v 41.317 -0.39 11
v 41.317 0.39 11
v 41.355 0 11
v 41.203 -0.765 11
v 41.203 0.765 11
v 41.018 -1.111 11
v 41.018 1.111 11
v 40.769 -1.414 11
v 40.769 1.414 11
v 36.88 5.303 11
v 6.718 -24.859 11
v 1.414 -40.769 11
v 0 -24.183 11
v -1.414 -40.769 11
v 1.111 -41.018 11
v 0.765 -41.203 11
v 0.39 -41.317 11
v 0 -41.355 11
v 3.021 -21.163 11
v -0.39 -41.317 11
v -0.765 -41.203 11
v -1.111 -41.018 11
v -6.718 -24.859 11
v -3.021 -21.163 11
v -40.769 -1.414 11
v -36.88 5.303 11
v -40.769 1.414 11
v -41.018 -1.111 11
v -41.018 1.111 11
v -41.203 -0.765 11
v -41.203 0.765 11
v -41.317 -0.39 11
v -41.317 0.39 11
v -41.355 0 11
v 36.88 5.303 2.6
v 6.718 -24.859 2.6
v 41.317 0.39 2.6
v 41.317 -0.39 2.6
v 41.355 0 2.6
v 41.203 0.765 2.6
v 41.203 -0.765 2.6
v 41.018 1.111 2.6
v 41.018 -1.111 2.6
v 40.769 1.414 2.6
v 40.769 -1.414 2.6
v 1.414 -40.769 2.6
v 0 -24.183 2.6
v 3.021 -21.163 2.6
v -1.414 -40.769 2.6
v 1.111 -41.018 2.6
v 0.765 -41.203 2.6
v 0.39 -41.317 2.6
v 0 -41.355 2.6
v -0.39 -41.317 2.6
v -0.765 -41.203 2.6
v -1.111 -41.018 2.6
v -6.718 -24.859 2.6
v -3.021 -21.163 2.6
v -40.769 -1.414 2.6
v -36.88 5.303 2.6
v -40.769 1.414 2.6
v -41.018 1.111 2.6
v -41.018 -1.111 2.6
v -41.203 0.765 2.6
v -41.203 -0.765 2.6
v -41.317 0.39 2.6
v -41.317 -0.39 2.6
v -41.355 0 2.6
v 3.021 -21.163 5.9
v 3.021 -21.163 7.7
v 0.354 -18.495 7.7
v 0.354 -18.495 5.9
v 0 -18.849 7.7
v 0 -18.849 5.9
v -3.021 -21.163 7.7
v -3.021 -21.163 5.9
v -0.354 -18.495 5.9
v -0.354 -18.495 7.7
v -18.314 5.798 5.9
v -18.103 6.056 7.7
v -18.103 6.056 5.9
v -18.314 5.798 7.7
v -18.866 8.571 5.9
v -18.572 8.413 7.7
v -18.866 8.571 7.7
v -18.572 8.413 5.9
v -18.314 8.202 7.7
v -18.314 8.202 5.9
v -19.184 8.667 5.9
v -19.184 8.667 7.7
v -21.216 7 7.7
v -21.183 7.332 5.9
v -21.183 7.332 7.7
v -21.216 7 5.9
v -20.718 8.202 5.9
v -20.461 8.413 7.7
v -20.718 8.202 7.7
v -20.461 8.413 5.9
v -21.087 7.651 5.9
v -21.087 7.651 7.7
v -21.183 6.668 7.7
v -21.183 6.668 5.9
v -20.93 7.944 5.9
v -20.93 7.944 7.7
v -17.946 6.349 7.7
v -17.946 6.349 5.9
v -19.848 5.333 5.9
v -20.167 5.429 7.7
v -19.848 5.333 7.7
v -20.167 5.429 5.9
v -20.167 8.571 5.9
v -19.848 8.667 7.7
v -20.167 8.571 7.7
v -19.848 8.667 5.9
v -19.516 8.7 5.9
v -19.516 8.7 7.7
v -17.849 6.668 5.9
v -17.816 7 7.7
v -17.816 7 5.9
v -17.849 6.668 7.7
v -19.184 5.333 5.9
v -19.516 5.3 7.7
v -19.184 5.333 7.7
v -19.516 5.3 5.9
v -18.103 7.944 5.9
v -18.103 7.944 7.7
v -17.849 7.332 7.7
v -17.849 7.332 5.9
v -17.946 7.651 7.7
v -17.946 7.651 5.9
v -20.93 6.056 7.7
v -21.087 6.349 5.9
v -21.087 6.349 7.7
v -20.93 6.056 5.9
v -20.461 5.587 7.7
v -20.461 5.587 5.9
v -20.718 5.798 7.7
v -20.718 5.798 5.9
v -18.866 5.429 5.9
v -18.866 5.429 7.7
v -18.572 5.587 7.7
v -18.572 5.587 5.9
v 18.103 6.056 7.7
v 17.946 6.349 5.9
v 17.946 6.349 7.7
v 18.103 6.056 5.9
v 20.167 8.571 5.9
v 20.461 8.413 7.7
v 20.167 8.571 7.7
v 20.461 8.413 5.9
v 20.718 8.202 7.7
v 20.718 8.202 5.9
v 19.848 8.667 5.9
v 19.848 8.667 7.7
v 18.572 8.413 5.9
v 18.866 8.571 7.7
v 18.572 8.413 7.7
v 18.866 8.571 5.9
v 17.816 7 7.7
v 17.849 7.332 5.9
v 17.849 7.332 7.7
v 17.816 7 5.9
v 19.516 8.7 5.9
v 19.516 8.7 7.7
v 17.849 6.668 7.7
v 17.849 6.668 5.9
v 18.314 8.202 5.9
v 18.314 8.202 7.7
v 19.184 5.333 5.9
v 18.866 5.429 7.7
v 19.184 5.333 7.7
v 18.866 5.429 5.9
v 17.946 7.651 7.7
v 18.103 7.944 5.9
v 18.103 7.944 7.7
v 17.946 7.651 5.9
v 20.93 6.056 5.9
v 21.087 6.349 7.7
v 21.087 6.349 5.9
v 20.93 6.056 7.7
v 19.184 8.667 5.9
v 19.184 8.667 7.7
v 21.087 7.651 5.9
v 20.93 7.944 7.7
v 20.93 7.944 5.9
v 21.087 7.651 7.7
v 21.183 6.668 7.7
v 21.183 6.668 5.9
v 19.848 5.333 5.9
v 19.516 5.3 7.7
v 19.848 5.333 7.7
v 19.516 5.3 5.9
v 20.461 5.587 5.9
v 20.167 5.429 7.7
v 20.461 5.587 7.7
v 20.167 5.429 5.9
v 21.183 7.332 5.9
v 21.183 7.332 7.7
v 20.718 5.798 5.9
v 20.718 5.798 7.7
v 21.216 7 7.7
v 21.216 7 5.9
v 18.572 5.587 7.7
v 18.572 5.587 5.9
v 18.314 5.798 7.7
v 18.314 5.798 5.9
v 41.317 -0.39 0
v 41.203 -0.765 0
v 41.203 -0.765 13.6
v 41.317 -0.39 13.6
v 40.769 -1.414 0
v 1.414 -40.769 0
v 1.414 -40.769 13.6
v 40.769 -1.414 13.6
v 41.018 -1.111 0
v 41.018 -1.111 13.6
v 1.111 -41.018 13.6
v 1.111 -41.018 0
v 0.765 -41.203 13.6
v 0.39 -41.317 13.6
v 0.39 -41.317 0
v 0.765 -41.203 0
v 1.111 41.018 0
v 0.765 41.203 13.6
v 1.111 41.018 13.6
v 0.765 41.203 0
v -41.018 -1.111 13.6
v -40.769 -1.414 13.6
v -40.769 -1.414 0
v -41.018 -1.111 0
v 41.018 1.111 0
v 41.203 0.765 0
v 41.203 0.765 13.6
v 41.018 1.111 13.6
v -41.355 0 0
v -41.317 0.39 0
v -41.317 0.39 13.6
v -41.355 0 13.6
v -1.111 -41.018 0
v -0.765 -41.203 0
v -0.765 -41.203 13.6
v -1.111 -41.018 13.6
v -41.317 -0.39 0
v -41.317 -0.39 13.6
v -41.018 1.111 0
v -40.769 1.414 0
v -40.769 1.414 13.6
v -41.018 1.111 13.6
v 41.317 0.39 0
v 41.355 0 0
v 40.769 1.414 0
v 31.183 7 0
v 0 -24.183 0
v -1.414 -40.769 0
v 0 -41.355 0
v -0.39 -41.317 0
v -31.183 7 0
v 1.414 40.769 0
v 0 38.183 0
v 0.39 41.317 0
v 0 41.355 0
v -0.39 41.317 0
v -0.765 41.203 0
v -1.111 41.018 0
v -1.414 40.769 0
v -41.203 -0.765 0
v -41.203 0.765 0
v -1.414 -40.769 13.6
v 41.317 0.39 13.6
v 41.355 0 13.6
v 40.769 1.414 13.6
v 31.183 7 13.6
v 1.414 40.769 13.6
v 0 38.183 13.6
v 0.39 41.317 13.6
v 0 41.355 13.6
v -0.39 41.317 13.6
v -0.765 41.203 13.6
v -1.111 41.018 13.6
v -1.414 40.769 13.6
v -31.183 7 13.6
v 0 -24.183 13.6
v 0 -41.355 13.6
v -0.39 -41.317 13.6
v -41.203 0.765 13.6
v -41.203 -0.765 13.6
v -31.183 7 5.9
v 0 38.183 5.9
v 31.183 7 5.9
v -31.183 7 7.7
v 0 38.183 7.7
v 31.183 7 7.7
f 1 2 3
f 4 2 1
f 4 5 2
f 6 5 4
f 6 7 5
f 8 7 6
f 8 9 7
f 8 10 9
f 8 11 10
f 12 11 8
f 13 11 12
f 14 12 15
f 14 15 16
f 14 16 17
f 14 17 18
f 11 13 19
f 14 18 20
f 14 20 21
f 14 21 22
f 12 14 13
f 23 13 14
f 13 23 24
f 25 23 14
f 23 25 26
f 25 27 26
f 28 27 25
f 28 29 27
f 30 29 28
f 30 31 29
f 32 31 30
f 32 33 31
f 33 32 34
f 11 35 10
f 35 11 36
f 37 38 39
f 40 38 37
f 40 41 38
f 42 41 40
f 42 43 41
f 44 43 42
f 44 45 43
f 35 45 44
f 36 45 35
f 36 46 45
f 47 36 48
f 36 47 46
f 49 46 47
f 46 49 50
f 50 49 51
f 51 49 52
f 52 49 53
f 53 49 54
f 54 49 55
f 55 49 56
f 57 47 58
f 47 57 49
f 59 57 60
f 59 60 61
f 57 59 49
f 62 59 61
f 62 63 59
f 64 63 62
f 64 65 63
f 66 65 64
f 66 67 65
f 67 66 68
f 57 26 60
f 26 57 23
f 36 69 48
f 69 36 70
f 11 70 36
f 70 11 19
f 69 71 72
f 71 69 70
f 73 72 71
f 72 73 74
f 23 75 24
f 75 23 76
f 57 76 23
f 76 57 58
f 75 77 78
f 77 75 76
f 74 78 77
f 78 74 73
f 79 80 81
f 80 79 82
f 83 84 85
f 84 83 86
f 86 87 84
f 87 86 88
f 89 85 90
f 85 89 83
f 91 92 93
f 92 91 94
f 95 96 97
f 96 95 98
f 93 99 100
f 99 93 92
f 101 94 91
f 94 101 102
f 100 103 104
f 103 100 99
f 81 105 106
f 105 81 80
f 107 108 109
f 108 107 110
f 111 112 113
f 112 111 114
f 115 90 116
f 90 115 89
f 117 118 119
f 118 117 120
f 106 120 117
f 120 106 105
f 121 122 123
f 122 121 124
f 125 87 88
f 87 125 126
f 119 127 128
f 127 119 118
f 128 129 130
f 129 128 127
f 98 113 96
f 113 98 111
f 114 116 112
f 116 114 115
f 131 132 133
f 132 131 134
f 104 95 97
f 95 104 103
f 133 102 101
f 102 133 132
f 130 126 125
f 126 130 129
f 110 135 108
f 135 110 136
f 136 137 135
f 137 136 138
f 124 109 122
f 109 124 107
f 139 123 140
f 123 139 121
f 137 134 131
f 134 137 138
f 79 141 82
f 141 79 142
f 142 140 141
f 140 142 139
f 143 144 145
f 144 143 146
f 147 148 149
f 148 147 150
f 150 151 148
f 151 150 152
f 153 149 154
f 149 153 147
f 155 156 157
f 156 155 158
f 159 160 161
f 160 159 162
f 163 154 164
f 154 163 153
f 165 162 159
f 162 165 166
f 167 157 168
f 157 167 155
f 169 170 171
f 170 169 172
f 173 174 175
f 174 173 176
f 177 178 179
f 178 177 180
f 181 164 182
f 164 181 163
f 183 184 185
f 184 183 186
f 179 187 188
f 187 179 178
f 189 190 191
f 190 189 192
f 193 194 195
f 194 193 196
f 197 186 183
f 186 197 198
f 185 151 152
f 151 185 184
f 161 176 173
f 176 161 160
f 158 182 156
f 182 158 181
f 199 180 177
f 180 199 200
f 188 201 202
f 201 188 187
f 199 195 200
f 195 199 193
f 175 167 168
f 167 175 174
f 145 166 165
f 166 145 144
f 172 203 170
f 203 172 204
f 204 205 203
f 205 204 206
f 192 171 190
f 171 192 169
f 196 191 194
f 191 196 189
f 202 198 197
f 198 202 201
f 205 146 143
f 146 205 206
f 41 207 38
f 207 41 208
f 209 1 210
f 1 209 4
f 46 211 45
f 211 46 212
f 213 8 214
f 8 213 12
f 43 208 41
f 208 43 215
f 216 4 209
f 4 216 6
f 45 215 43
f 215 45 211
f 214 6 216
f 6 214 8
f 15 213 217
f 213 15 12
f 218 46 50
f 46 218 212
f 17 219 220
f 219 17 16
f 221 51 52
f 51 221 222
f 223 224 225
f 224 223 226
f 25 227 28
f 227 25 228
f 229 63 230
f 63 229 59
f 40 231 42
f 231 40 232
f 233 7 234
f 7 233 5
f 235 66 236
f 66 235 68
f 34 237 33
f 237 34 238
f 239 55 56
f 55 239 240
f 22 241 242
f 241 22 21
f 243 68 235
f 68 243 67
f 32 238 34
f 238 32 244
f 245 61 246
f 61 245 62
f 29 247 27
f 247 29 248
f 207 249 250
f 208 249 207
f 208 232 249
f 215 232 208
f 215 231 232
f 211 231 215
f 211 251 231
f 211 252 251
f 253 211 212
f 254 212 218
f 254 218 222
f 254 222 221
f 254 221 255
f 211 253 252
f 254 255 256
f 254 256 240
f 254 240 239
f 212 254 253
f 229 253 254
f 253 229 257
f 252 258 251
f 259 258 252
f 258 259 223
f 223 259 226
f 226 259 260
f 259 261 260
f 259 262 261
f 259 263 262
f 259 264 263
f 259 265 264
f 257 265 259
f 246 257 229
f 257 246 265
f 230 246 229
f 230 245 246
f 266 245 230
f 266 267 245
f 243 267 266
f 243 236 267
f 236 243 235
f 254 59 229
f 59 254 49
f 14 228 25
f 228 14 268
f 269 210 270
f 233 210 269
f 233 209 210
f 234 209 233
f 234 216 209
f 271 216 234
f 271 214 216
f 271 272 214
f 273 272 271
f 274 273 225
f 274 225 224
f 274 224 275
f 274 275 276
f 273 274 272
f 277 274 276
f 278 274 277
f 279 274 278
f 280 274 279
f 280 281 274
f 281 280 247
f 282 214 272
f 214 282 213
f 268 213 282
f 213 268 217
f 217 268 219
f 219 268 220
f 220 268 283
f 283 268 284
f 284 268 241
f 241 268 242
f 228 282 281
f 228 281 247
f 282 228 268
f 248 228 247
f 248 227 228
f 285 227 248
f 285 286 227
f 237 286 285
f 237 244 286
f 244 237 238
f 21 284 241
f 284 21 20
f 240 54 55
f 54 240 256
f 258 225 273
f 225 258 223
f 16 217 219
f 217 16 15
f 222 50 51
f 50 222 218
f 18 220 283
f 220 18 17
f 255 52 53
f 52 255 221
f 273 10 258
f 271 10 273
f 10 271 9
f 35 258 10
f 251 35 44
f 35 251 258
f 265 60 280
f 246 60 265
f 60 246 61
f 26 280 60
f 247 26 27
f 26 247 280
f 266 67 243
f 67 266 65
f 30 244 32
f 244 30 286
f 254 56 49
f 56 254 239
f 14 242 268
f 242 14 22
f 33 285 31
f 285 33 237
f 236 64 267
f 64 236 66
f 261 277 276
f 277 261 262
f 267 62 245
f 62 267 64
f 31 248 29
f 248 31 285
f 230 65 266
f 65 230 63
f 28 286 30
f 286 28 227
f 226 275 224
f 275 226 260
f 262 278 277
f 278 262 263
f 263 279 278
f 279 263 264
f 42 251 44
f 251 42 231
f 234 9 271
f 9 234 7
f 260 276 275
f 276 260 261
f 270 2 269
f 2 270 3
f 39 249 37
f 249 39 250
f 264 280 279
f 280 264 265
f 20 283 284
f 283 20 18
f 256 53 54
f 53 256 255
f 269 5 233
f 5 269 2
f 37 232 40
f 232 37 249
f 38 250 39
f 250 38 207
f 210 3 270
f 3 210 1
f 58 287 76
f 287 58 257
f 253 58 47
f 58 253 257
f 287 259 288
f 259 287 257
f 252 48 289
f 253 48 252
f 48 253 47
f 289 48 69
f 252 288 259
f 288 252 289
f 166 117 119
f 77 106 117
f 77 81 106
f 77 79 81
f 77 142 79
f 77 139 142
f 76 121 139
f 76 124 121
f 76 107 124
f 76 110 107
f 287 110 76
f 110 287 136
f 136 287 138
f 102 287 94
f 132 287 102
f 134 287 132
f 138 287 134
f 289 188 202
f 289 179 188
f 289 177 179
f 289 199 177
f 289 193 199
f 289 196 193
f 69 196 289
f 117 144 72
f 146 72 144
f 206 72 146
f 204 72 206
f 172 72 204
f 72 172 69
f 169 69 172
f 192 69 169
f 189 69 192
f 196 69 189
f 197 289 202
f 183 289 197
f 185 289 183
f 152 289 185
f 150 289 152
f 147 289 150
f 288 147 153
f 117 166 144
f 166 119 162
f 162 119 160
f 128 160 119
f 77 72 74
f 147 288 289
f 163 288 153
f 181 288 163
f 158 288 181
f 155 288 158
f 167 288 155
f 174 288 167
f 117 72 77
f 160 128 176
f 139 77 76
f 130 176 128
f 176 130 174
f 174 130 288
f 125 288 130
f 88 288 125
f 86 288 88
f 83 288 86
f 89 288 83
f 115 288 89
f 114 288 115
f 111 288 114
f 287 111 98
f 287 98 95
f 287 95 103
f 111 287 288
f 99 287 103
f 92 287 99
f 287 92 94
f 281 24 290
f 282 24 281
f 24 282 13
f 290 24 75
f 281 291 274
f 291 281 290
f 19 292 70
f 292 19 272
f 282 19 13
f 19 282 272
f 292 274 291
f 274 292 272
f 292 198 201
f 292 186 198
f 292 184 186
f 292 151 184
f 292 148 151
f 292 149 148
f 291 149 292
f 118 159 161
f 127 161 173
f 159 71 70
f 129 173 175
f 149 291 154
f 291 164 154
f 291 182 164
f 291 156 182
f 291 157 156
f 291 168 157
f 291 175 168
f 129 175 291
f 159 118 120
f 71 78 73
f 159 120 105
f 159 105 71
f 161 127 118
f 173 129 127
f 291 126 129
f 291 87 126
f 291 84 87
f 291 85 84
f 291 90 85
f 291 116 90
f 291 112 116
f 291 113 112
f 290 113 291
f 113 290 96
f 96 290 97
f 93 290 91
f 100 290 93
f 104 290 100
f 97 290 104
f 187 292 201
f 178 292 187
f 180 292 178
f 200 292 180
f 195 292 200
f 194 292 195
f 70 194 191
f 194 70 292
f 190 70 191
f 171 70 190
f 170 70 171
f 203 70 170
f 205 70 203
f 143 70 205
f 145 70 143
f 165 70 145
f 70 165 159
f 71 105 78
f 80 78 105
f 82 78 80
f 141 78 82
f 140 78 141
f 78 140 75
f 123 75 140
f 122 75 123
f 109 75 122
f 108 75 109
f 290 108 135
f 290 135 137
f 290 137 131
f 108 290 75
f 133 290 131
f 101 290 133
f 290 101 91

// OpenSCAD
// ============================================================
// Filla IQ — NFC Wall Mount (Dual PN532 Sandwich)
//
// Two PN532 boards mounted back-to-back, screwed to a plastic
// center piece. The whole assembly straddles a diagonal brace
// member above the X on the left side wall.
//
// The bottom V of the diamond sits over the brace — each lower
// edge grips one side, like a saddle. The brace runs through
// the V-channel at the bottom, NOT through the center of the
// sandwich.
//
// BRACE GEOMETRY (from 3MF analysis):
//   Each diagonal member: 12.2mm wide, ~8mm thick
//   Diagonal angle: ~47° from horizontal
//
// Print flat (one PN532 face down on bed)
// ============================================================

// === PN532 BOARD (red ~43mm square) ===
pn532_w       = 43.5;       // board width + tolerance
pn532_h       = 43.5;       // board height + tolerance
pn532_pcb_t   = 1.6;        // PCB thickness
pn532_comp_t  = 3.0;        // component height on back face
pn532_hole_d  = 3.2;        // mounting hole diameter
pn532_hole_inset = 7.95;    // hole center from board edge (measured)

// === BRACE MEMBER (from 3MF mesh) ===
brace_w       = 12.2;       // member width (in wall plane)
brace_t       = 8.0;        // member thickness (depth from wall)
brace_fillet  = 3.0;        // fillet radius on brace corners
diag_angle    = 47;

// === BODY SHELL ===
// PCBs sit in pockets on each face, screwed in (no slide-in slots).
// Components face outward into the pocket cavity.
face_t        = 1.2;        // thin face shell over antenna area for NFC range
center_t      = 2.0;        // solid center between the two comp cavities

// Total body thickness
body_thick    = 2 * (face_t + pn532_pcb_t + pn532_comp_t) + center_t;
// = 2*(1.2 + 1.6 + 3.0) + 2.0 = 13.6mm

// === BOARD OFFSET (scoot up to clear brace slot) ===
board_offset_y = 7;            // shift boards up from diamond center

// === DIAMOND OUTLINE (auto-sized for offset boards + frame) ===
frame_min     = 4;             // min solid frame around board pocket
board_reach   = board_offset_y + (max(pn532_w, pn532_h) + 0.6) * sqrt(2) / 2;
diamond_diag  = 2 * (board_reach + frame_min);   // ~84.4mm tip-to-tip
diamond_side  = diamond_diag / sqrt(2);           // ~59.7mm side

// === BRACE SLOT (rectangular channel at bottom for brace passage) ===
chan_clearance = 0.4;
chan_w         = brace_t + chan_clearance;     // 8.4mm channel width in Z (body thickness)
chan_depth     = brace_w + 12;                // how far up from bottom tip (~24mm)
brace_slot_w  = brace_w + 1;                 // slot width perpendicular to brace

// Channel is centered in body thickness
chan_z0        = (body_thick - chan_w) / 2;
chan_z1        = chan_z0 + chan_w;

// Slot center Y position (centered in the channel zone above bottom tip)
brace_slot_y  = -diamond_diag/2 + chan_depth/2;

// === SCREW HOLES ===
screw_d       = 3.4;         // M3 clearance
screw_head_d  = 6.0;         // M3 cap head
screw_head_h  = 3.0;

show_ghosts = false;  // set true to visualize boards + brace in OpenSCAD

$fn = 32;

// Z-STACK (local Z, 0 = side B exterior face)
z_pcb_b       = face_t;                           // 1.2
z_comp_b      = z_pcb_b + pn532_pcb_t;            // 2.8
z_center      = z_comp_b + pn532_comp_t;           // 5.8
z_comp_a      = z_center + center_t;               // 7.8
z_pcb_a       = z_comp_a + pn532_comp_t;           // 10.8
z_face_a      = z_pcb_a + pn532_pcb_t;             // 12.4


// ============================================================
// MODULES
// ============================================================

module diamond_2d() {
    rotate([0, 0, 45])
    offset(r = 2) offset(r = -2)
    square([diamond_side, diamond_side], center = true);
}

module pn532_2d() {
    translate([0, board_offset_y])
    rotate([0, 0, 45])
    offset(delta = 0.3)
    square([pn532_w, pn532_h], center = true);
}

module screw_positions() {
    // 2 holes per board at opposite diagonal corners
    // Use the left-right pair (not top-bottom) to avoid V-channel zone
    h_off = pn532_w/2 - pn532_hole_inset;  // ~13.8mm from center
    translate([0, board_offset_y, 0])
    rotate([0, 0, 45])
    for (s = [-1, 1])
        translate([s * h_off, -s * h_off, 0])
        children();
}


module nfc_mount() {
    difference() {
        // Solid diamond body
        linear_extrude(body_thick)
        diamond_2d();

        // === V-CHANNELS (grooves along both lower edges) ===
        // Each lower edge gets a groove: open on the outer face,
        // runs the full edge length, with a wall on the inside.
        // The brace sits in these grooves.
        chan_groove_d  = brace_t/2 + brace_fillet + 0.5;  // groove depth into arm (~7.5mm)
        for (mx = [0, 1]) {
            mirror([mx, 0, 0])
            translate([0, -diamond_diag/2, 0])
            rotate([0, 0, 45]) {
                // Main groove at brace Z-range
                translate([-1, -50, chan_z0])
                cube([diamond_side + 2, 50 + chan_groove_d, chan_w]);
            }
        }

        // Clip inner wall of grooves near bottom tip for X brace junction fillet
        // The fillet where the two brace members join adds material at the
        // inside corner — deepen the grooves near the tip to clear it.
        for (mx = [0, 1]) {
            mirror([mx, 0, 0])
            translate([0, -diamond_diag/2, 0])
            rotate([0, 0, 45]) {
                translate([-1, -50, chan_z0])
                cube([brace_fillet * 6, 50 + chan_groove_d + brace_fillet * 3, chan_w]);
            }
        }

        // === PN532 POCKETS (no slide-in slots, boards screw in) ===

        // Side B (bottom face): PCB recess + component cavity
        translate([0, 0, -0.1])
        linear_extrude(face_t + pn532_pcb_t + 0.1)
        pn532_2d();

        translate([0, 0, z_comp_b])
        linear_extrude(pn532_comp_t + 0.1)
        pn532_2d();

        // Side A (top face): PCB recess + component cavity
        translate([0, 0, z_pcb_a])
        linear_extrude(pn532_pcb_t + face_t + 0.2)
        pn532_2d();

        translate([0, 0, z_comp_a - 0.1])
        linear_extrude(pn532_comp_t + 0.1)
        pn532_2d();

        // === SCREW HOLES (M3, through entire body) ===
        screw_positions() {
            translate([0, 0, -0.1])
            cylinder(d = screw_d, h = body_thick + 0.2);
        }

    }
}


// ============================================================
// RENDER
// ============================================================

color("SteelBlue", 0.85)
nfc_mount();

if (show_ghosts) {
    // Ghost PN532 boards (sitting in pockets, offset up)
    color("Red", 0.5) {
        // Side A (top)
        translate([0, board_offset_y, z_pcb_a])
        linear_extrude(pn532_pcb_t)
        rotate([0, 0, 45])
        square([pn532_w, pn532_h], center = true);

        // Side B (bottom)
        translate([0, board_offset_y, face_t])
        linear_extrude(pn532_pcb_t)
        rotate([0, 0, 45])
        square([pn532_w, pn532_h], center = true);
    }

    // Ghost brace member (sits in the brace slot)
    color("BurlyWood", 0.3) {
        brace_len = 100;
        translate([0, brace_slot_y, chan_z0])
        rotate([0, 0, diag_angle])
        translate([-brace_len/2, -brace_w/2, 0])
        cube([brace_len, brace_w, brace_t]);
    }
}


// ============================================================
// BUILD INFO
// ============================================================

echo("=== NFC WALL MOUNT — DUAL PN532 SANDWICH ===");
echo(str("Total thickness: ", body_thick, "mm"));
echo(str("Diamond: ", diamond_side, "mm side (", diamond_diag, "mm tip-to-tip)"));
echo(str("Brace slot: ", brace_slot_w, "mm wide, at Y=", brace_slot_y, ", Z=", chan_z0, " to ", chan_z1));
echo(str("  Slot depth from bottom tip: ", chan_depth, "mm"));
echo("");
echo(str("Board offset from center: +", board_offset_y, "mm (up, away from brace)"));
echo("PCB pockets on both faces (screwed in, no slide slots):");
echo(str("  Side B: PCB at Z=", face_t, ", comps Z=", z_comp_b, " to ", z_center));
echo(str("  Side A: PCB at Z=", z_pcb_a, ", comps Z=", z_comp_a, " to ", z_pcb_a));
echo("");
echo("HARDWARE: 2x M3 screw + nut (opposite diagonal corners, through both boards)");
echo("PRINT: flat on one face.");
echo("MOUNT: slide bottom V over brace member, screw boards on.");
